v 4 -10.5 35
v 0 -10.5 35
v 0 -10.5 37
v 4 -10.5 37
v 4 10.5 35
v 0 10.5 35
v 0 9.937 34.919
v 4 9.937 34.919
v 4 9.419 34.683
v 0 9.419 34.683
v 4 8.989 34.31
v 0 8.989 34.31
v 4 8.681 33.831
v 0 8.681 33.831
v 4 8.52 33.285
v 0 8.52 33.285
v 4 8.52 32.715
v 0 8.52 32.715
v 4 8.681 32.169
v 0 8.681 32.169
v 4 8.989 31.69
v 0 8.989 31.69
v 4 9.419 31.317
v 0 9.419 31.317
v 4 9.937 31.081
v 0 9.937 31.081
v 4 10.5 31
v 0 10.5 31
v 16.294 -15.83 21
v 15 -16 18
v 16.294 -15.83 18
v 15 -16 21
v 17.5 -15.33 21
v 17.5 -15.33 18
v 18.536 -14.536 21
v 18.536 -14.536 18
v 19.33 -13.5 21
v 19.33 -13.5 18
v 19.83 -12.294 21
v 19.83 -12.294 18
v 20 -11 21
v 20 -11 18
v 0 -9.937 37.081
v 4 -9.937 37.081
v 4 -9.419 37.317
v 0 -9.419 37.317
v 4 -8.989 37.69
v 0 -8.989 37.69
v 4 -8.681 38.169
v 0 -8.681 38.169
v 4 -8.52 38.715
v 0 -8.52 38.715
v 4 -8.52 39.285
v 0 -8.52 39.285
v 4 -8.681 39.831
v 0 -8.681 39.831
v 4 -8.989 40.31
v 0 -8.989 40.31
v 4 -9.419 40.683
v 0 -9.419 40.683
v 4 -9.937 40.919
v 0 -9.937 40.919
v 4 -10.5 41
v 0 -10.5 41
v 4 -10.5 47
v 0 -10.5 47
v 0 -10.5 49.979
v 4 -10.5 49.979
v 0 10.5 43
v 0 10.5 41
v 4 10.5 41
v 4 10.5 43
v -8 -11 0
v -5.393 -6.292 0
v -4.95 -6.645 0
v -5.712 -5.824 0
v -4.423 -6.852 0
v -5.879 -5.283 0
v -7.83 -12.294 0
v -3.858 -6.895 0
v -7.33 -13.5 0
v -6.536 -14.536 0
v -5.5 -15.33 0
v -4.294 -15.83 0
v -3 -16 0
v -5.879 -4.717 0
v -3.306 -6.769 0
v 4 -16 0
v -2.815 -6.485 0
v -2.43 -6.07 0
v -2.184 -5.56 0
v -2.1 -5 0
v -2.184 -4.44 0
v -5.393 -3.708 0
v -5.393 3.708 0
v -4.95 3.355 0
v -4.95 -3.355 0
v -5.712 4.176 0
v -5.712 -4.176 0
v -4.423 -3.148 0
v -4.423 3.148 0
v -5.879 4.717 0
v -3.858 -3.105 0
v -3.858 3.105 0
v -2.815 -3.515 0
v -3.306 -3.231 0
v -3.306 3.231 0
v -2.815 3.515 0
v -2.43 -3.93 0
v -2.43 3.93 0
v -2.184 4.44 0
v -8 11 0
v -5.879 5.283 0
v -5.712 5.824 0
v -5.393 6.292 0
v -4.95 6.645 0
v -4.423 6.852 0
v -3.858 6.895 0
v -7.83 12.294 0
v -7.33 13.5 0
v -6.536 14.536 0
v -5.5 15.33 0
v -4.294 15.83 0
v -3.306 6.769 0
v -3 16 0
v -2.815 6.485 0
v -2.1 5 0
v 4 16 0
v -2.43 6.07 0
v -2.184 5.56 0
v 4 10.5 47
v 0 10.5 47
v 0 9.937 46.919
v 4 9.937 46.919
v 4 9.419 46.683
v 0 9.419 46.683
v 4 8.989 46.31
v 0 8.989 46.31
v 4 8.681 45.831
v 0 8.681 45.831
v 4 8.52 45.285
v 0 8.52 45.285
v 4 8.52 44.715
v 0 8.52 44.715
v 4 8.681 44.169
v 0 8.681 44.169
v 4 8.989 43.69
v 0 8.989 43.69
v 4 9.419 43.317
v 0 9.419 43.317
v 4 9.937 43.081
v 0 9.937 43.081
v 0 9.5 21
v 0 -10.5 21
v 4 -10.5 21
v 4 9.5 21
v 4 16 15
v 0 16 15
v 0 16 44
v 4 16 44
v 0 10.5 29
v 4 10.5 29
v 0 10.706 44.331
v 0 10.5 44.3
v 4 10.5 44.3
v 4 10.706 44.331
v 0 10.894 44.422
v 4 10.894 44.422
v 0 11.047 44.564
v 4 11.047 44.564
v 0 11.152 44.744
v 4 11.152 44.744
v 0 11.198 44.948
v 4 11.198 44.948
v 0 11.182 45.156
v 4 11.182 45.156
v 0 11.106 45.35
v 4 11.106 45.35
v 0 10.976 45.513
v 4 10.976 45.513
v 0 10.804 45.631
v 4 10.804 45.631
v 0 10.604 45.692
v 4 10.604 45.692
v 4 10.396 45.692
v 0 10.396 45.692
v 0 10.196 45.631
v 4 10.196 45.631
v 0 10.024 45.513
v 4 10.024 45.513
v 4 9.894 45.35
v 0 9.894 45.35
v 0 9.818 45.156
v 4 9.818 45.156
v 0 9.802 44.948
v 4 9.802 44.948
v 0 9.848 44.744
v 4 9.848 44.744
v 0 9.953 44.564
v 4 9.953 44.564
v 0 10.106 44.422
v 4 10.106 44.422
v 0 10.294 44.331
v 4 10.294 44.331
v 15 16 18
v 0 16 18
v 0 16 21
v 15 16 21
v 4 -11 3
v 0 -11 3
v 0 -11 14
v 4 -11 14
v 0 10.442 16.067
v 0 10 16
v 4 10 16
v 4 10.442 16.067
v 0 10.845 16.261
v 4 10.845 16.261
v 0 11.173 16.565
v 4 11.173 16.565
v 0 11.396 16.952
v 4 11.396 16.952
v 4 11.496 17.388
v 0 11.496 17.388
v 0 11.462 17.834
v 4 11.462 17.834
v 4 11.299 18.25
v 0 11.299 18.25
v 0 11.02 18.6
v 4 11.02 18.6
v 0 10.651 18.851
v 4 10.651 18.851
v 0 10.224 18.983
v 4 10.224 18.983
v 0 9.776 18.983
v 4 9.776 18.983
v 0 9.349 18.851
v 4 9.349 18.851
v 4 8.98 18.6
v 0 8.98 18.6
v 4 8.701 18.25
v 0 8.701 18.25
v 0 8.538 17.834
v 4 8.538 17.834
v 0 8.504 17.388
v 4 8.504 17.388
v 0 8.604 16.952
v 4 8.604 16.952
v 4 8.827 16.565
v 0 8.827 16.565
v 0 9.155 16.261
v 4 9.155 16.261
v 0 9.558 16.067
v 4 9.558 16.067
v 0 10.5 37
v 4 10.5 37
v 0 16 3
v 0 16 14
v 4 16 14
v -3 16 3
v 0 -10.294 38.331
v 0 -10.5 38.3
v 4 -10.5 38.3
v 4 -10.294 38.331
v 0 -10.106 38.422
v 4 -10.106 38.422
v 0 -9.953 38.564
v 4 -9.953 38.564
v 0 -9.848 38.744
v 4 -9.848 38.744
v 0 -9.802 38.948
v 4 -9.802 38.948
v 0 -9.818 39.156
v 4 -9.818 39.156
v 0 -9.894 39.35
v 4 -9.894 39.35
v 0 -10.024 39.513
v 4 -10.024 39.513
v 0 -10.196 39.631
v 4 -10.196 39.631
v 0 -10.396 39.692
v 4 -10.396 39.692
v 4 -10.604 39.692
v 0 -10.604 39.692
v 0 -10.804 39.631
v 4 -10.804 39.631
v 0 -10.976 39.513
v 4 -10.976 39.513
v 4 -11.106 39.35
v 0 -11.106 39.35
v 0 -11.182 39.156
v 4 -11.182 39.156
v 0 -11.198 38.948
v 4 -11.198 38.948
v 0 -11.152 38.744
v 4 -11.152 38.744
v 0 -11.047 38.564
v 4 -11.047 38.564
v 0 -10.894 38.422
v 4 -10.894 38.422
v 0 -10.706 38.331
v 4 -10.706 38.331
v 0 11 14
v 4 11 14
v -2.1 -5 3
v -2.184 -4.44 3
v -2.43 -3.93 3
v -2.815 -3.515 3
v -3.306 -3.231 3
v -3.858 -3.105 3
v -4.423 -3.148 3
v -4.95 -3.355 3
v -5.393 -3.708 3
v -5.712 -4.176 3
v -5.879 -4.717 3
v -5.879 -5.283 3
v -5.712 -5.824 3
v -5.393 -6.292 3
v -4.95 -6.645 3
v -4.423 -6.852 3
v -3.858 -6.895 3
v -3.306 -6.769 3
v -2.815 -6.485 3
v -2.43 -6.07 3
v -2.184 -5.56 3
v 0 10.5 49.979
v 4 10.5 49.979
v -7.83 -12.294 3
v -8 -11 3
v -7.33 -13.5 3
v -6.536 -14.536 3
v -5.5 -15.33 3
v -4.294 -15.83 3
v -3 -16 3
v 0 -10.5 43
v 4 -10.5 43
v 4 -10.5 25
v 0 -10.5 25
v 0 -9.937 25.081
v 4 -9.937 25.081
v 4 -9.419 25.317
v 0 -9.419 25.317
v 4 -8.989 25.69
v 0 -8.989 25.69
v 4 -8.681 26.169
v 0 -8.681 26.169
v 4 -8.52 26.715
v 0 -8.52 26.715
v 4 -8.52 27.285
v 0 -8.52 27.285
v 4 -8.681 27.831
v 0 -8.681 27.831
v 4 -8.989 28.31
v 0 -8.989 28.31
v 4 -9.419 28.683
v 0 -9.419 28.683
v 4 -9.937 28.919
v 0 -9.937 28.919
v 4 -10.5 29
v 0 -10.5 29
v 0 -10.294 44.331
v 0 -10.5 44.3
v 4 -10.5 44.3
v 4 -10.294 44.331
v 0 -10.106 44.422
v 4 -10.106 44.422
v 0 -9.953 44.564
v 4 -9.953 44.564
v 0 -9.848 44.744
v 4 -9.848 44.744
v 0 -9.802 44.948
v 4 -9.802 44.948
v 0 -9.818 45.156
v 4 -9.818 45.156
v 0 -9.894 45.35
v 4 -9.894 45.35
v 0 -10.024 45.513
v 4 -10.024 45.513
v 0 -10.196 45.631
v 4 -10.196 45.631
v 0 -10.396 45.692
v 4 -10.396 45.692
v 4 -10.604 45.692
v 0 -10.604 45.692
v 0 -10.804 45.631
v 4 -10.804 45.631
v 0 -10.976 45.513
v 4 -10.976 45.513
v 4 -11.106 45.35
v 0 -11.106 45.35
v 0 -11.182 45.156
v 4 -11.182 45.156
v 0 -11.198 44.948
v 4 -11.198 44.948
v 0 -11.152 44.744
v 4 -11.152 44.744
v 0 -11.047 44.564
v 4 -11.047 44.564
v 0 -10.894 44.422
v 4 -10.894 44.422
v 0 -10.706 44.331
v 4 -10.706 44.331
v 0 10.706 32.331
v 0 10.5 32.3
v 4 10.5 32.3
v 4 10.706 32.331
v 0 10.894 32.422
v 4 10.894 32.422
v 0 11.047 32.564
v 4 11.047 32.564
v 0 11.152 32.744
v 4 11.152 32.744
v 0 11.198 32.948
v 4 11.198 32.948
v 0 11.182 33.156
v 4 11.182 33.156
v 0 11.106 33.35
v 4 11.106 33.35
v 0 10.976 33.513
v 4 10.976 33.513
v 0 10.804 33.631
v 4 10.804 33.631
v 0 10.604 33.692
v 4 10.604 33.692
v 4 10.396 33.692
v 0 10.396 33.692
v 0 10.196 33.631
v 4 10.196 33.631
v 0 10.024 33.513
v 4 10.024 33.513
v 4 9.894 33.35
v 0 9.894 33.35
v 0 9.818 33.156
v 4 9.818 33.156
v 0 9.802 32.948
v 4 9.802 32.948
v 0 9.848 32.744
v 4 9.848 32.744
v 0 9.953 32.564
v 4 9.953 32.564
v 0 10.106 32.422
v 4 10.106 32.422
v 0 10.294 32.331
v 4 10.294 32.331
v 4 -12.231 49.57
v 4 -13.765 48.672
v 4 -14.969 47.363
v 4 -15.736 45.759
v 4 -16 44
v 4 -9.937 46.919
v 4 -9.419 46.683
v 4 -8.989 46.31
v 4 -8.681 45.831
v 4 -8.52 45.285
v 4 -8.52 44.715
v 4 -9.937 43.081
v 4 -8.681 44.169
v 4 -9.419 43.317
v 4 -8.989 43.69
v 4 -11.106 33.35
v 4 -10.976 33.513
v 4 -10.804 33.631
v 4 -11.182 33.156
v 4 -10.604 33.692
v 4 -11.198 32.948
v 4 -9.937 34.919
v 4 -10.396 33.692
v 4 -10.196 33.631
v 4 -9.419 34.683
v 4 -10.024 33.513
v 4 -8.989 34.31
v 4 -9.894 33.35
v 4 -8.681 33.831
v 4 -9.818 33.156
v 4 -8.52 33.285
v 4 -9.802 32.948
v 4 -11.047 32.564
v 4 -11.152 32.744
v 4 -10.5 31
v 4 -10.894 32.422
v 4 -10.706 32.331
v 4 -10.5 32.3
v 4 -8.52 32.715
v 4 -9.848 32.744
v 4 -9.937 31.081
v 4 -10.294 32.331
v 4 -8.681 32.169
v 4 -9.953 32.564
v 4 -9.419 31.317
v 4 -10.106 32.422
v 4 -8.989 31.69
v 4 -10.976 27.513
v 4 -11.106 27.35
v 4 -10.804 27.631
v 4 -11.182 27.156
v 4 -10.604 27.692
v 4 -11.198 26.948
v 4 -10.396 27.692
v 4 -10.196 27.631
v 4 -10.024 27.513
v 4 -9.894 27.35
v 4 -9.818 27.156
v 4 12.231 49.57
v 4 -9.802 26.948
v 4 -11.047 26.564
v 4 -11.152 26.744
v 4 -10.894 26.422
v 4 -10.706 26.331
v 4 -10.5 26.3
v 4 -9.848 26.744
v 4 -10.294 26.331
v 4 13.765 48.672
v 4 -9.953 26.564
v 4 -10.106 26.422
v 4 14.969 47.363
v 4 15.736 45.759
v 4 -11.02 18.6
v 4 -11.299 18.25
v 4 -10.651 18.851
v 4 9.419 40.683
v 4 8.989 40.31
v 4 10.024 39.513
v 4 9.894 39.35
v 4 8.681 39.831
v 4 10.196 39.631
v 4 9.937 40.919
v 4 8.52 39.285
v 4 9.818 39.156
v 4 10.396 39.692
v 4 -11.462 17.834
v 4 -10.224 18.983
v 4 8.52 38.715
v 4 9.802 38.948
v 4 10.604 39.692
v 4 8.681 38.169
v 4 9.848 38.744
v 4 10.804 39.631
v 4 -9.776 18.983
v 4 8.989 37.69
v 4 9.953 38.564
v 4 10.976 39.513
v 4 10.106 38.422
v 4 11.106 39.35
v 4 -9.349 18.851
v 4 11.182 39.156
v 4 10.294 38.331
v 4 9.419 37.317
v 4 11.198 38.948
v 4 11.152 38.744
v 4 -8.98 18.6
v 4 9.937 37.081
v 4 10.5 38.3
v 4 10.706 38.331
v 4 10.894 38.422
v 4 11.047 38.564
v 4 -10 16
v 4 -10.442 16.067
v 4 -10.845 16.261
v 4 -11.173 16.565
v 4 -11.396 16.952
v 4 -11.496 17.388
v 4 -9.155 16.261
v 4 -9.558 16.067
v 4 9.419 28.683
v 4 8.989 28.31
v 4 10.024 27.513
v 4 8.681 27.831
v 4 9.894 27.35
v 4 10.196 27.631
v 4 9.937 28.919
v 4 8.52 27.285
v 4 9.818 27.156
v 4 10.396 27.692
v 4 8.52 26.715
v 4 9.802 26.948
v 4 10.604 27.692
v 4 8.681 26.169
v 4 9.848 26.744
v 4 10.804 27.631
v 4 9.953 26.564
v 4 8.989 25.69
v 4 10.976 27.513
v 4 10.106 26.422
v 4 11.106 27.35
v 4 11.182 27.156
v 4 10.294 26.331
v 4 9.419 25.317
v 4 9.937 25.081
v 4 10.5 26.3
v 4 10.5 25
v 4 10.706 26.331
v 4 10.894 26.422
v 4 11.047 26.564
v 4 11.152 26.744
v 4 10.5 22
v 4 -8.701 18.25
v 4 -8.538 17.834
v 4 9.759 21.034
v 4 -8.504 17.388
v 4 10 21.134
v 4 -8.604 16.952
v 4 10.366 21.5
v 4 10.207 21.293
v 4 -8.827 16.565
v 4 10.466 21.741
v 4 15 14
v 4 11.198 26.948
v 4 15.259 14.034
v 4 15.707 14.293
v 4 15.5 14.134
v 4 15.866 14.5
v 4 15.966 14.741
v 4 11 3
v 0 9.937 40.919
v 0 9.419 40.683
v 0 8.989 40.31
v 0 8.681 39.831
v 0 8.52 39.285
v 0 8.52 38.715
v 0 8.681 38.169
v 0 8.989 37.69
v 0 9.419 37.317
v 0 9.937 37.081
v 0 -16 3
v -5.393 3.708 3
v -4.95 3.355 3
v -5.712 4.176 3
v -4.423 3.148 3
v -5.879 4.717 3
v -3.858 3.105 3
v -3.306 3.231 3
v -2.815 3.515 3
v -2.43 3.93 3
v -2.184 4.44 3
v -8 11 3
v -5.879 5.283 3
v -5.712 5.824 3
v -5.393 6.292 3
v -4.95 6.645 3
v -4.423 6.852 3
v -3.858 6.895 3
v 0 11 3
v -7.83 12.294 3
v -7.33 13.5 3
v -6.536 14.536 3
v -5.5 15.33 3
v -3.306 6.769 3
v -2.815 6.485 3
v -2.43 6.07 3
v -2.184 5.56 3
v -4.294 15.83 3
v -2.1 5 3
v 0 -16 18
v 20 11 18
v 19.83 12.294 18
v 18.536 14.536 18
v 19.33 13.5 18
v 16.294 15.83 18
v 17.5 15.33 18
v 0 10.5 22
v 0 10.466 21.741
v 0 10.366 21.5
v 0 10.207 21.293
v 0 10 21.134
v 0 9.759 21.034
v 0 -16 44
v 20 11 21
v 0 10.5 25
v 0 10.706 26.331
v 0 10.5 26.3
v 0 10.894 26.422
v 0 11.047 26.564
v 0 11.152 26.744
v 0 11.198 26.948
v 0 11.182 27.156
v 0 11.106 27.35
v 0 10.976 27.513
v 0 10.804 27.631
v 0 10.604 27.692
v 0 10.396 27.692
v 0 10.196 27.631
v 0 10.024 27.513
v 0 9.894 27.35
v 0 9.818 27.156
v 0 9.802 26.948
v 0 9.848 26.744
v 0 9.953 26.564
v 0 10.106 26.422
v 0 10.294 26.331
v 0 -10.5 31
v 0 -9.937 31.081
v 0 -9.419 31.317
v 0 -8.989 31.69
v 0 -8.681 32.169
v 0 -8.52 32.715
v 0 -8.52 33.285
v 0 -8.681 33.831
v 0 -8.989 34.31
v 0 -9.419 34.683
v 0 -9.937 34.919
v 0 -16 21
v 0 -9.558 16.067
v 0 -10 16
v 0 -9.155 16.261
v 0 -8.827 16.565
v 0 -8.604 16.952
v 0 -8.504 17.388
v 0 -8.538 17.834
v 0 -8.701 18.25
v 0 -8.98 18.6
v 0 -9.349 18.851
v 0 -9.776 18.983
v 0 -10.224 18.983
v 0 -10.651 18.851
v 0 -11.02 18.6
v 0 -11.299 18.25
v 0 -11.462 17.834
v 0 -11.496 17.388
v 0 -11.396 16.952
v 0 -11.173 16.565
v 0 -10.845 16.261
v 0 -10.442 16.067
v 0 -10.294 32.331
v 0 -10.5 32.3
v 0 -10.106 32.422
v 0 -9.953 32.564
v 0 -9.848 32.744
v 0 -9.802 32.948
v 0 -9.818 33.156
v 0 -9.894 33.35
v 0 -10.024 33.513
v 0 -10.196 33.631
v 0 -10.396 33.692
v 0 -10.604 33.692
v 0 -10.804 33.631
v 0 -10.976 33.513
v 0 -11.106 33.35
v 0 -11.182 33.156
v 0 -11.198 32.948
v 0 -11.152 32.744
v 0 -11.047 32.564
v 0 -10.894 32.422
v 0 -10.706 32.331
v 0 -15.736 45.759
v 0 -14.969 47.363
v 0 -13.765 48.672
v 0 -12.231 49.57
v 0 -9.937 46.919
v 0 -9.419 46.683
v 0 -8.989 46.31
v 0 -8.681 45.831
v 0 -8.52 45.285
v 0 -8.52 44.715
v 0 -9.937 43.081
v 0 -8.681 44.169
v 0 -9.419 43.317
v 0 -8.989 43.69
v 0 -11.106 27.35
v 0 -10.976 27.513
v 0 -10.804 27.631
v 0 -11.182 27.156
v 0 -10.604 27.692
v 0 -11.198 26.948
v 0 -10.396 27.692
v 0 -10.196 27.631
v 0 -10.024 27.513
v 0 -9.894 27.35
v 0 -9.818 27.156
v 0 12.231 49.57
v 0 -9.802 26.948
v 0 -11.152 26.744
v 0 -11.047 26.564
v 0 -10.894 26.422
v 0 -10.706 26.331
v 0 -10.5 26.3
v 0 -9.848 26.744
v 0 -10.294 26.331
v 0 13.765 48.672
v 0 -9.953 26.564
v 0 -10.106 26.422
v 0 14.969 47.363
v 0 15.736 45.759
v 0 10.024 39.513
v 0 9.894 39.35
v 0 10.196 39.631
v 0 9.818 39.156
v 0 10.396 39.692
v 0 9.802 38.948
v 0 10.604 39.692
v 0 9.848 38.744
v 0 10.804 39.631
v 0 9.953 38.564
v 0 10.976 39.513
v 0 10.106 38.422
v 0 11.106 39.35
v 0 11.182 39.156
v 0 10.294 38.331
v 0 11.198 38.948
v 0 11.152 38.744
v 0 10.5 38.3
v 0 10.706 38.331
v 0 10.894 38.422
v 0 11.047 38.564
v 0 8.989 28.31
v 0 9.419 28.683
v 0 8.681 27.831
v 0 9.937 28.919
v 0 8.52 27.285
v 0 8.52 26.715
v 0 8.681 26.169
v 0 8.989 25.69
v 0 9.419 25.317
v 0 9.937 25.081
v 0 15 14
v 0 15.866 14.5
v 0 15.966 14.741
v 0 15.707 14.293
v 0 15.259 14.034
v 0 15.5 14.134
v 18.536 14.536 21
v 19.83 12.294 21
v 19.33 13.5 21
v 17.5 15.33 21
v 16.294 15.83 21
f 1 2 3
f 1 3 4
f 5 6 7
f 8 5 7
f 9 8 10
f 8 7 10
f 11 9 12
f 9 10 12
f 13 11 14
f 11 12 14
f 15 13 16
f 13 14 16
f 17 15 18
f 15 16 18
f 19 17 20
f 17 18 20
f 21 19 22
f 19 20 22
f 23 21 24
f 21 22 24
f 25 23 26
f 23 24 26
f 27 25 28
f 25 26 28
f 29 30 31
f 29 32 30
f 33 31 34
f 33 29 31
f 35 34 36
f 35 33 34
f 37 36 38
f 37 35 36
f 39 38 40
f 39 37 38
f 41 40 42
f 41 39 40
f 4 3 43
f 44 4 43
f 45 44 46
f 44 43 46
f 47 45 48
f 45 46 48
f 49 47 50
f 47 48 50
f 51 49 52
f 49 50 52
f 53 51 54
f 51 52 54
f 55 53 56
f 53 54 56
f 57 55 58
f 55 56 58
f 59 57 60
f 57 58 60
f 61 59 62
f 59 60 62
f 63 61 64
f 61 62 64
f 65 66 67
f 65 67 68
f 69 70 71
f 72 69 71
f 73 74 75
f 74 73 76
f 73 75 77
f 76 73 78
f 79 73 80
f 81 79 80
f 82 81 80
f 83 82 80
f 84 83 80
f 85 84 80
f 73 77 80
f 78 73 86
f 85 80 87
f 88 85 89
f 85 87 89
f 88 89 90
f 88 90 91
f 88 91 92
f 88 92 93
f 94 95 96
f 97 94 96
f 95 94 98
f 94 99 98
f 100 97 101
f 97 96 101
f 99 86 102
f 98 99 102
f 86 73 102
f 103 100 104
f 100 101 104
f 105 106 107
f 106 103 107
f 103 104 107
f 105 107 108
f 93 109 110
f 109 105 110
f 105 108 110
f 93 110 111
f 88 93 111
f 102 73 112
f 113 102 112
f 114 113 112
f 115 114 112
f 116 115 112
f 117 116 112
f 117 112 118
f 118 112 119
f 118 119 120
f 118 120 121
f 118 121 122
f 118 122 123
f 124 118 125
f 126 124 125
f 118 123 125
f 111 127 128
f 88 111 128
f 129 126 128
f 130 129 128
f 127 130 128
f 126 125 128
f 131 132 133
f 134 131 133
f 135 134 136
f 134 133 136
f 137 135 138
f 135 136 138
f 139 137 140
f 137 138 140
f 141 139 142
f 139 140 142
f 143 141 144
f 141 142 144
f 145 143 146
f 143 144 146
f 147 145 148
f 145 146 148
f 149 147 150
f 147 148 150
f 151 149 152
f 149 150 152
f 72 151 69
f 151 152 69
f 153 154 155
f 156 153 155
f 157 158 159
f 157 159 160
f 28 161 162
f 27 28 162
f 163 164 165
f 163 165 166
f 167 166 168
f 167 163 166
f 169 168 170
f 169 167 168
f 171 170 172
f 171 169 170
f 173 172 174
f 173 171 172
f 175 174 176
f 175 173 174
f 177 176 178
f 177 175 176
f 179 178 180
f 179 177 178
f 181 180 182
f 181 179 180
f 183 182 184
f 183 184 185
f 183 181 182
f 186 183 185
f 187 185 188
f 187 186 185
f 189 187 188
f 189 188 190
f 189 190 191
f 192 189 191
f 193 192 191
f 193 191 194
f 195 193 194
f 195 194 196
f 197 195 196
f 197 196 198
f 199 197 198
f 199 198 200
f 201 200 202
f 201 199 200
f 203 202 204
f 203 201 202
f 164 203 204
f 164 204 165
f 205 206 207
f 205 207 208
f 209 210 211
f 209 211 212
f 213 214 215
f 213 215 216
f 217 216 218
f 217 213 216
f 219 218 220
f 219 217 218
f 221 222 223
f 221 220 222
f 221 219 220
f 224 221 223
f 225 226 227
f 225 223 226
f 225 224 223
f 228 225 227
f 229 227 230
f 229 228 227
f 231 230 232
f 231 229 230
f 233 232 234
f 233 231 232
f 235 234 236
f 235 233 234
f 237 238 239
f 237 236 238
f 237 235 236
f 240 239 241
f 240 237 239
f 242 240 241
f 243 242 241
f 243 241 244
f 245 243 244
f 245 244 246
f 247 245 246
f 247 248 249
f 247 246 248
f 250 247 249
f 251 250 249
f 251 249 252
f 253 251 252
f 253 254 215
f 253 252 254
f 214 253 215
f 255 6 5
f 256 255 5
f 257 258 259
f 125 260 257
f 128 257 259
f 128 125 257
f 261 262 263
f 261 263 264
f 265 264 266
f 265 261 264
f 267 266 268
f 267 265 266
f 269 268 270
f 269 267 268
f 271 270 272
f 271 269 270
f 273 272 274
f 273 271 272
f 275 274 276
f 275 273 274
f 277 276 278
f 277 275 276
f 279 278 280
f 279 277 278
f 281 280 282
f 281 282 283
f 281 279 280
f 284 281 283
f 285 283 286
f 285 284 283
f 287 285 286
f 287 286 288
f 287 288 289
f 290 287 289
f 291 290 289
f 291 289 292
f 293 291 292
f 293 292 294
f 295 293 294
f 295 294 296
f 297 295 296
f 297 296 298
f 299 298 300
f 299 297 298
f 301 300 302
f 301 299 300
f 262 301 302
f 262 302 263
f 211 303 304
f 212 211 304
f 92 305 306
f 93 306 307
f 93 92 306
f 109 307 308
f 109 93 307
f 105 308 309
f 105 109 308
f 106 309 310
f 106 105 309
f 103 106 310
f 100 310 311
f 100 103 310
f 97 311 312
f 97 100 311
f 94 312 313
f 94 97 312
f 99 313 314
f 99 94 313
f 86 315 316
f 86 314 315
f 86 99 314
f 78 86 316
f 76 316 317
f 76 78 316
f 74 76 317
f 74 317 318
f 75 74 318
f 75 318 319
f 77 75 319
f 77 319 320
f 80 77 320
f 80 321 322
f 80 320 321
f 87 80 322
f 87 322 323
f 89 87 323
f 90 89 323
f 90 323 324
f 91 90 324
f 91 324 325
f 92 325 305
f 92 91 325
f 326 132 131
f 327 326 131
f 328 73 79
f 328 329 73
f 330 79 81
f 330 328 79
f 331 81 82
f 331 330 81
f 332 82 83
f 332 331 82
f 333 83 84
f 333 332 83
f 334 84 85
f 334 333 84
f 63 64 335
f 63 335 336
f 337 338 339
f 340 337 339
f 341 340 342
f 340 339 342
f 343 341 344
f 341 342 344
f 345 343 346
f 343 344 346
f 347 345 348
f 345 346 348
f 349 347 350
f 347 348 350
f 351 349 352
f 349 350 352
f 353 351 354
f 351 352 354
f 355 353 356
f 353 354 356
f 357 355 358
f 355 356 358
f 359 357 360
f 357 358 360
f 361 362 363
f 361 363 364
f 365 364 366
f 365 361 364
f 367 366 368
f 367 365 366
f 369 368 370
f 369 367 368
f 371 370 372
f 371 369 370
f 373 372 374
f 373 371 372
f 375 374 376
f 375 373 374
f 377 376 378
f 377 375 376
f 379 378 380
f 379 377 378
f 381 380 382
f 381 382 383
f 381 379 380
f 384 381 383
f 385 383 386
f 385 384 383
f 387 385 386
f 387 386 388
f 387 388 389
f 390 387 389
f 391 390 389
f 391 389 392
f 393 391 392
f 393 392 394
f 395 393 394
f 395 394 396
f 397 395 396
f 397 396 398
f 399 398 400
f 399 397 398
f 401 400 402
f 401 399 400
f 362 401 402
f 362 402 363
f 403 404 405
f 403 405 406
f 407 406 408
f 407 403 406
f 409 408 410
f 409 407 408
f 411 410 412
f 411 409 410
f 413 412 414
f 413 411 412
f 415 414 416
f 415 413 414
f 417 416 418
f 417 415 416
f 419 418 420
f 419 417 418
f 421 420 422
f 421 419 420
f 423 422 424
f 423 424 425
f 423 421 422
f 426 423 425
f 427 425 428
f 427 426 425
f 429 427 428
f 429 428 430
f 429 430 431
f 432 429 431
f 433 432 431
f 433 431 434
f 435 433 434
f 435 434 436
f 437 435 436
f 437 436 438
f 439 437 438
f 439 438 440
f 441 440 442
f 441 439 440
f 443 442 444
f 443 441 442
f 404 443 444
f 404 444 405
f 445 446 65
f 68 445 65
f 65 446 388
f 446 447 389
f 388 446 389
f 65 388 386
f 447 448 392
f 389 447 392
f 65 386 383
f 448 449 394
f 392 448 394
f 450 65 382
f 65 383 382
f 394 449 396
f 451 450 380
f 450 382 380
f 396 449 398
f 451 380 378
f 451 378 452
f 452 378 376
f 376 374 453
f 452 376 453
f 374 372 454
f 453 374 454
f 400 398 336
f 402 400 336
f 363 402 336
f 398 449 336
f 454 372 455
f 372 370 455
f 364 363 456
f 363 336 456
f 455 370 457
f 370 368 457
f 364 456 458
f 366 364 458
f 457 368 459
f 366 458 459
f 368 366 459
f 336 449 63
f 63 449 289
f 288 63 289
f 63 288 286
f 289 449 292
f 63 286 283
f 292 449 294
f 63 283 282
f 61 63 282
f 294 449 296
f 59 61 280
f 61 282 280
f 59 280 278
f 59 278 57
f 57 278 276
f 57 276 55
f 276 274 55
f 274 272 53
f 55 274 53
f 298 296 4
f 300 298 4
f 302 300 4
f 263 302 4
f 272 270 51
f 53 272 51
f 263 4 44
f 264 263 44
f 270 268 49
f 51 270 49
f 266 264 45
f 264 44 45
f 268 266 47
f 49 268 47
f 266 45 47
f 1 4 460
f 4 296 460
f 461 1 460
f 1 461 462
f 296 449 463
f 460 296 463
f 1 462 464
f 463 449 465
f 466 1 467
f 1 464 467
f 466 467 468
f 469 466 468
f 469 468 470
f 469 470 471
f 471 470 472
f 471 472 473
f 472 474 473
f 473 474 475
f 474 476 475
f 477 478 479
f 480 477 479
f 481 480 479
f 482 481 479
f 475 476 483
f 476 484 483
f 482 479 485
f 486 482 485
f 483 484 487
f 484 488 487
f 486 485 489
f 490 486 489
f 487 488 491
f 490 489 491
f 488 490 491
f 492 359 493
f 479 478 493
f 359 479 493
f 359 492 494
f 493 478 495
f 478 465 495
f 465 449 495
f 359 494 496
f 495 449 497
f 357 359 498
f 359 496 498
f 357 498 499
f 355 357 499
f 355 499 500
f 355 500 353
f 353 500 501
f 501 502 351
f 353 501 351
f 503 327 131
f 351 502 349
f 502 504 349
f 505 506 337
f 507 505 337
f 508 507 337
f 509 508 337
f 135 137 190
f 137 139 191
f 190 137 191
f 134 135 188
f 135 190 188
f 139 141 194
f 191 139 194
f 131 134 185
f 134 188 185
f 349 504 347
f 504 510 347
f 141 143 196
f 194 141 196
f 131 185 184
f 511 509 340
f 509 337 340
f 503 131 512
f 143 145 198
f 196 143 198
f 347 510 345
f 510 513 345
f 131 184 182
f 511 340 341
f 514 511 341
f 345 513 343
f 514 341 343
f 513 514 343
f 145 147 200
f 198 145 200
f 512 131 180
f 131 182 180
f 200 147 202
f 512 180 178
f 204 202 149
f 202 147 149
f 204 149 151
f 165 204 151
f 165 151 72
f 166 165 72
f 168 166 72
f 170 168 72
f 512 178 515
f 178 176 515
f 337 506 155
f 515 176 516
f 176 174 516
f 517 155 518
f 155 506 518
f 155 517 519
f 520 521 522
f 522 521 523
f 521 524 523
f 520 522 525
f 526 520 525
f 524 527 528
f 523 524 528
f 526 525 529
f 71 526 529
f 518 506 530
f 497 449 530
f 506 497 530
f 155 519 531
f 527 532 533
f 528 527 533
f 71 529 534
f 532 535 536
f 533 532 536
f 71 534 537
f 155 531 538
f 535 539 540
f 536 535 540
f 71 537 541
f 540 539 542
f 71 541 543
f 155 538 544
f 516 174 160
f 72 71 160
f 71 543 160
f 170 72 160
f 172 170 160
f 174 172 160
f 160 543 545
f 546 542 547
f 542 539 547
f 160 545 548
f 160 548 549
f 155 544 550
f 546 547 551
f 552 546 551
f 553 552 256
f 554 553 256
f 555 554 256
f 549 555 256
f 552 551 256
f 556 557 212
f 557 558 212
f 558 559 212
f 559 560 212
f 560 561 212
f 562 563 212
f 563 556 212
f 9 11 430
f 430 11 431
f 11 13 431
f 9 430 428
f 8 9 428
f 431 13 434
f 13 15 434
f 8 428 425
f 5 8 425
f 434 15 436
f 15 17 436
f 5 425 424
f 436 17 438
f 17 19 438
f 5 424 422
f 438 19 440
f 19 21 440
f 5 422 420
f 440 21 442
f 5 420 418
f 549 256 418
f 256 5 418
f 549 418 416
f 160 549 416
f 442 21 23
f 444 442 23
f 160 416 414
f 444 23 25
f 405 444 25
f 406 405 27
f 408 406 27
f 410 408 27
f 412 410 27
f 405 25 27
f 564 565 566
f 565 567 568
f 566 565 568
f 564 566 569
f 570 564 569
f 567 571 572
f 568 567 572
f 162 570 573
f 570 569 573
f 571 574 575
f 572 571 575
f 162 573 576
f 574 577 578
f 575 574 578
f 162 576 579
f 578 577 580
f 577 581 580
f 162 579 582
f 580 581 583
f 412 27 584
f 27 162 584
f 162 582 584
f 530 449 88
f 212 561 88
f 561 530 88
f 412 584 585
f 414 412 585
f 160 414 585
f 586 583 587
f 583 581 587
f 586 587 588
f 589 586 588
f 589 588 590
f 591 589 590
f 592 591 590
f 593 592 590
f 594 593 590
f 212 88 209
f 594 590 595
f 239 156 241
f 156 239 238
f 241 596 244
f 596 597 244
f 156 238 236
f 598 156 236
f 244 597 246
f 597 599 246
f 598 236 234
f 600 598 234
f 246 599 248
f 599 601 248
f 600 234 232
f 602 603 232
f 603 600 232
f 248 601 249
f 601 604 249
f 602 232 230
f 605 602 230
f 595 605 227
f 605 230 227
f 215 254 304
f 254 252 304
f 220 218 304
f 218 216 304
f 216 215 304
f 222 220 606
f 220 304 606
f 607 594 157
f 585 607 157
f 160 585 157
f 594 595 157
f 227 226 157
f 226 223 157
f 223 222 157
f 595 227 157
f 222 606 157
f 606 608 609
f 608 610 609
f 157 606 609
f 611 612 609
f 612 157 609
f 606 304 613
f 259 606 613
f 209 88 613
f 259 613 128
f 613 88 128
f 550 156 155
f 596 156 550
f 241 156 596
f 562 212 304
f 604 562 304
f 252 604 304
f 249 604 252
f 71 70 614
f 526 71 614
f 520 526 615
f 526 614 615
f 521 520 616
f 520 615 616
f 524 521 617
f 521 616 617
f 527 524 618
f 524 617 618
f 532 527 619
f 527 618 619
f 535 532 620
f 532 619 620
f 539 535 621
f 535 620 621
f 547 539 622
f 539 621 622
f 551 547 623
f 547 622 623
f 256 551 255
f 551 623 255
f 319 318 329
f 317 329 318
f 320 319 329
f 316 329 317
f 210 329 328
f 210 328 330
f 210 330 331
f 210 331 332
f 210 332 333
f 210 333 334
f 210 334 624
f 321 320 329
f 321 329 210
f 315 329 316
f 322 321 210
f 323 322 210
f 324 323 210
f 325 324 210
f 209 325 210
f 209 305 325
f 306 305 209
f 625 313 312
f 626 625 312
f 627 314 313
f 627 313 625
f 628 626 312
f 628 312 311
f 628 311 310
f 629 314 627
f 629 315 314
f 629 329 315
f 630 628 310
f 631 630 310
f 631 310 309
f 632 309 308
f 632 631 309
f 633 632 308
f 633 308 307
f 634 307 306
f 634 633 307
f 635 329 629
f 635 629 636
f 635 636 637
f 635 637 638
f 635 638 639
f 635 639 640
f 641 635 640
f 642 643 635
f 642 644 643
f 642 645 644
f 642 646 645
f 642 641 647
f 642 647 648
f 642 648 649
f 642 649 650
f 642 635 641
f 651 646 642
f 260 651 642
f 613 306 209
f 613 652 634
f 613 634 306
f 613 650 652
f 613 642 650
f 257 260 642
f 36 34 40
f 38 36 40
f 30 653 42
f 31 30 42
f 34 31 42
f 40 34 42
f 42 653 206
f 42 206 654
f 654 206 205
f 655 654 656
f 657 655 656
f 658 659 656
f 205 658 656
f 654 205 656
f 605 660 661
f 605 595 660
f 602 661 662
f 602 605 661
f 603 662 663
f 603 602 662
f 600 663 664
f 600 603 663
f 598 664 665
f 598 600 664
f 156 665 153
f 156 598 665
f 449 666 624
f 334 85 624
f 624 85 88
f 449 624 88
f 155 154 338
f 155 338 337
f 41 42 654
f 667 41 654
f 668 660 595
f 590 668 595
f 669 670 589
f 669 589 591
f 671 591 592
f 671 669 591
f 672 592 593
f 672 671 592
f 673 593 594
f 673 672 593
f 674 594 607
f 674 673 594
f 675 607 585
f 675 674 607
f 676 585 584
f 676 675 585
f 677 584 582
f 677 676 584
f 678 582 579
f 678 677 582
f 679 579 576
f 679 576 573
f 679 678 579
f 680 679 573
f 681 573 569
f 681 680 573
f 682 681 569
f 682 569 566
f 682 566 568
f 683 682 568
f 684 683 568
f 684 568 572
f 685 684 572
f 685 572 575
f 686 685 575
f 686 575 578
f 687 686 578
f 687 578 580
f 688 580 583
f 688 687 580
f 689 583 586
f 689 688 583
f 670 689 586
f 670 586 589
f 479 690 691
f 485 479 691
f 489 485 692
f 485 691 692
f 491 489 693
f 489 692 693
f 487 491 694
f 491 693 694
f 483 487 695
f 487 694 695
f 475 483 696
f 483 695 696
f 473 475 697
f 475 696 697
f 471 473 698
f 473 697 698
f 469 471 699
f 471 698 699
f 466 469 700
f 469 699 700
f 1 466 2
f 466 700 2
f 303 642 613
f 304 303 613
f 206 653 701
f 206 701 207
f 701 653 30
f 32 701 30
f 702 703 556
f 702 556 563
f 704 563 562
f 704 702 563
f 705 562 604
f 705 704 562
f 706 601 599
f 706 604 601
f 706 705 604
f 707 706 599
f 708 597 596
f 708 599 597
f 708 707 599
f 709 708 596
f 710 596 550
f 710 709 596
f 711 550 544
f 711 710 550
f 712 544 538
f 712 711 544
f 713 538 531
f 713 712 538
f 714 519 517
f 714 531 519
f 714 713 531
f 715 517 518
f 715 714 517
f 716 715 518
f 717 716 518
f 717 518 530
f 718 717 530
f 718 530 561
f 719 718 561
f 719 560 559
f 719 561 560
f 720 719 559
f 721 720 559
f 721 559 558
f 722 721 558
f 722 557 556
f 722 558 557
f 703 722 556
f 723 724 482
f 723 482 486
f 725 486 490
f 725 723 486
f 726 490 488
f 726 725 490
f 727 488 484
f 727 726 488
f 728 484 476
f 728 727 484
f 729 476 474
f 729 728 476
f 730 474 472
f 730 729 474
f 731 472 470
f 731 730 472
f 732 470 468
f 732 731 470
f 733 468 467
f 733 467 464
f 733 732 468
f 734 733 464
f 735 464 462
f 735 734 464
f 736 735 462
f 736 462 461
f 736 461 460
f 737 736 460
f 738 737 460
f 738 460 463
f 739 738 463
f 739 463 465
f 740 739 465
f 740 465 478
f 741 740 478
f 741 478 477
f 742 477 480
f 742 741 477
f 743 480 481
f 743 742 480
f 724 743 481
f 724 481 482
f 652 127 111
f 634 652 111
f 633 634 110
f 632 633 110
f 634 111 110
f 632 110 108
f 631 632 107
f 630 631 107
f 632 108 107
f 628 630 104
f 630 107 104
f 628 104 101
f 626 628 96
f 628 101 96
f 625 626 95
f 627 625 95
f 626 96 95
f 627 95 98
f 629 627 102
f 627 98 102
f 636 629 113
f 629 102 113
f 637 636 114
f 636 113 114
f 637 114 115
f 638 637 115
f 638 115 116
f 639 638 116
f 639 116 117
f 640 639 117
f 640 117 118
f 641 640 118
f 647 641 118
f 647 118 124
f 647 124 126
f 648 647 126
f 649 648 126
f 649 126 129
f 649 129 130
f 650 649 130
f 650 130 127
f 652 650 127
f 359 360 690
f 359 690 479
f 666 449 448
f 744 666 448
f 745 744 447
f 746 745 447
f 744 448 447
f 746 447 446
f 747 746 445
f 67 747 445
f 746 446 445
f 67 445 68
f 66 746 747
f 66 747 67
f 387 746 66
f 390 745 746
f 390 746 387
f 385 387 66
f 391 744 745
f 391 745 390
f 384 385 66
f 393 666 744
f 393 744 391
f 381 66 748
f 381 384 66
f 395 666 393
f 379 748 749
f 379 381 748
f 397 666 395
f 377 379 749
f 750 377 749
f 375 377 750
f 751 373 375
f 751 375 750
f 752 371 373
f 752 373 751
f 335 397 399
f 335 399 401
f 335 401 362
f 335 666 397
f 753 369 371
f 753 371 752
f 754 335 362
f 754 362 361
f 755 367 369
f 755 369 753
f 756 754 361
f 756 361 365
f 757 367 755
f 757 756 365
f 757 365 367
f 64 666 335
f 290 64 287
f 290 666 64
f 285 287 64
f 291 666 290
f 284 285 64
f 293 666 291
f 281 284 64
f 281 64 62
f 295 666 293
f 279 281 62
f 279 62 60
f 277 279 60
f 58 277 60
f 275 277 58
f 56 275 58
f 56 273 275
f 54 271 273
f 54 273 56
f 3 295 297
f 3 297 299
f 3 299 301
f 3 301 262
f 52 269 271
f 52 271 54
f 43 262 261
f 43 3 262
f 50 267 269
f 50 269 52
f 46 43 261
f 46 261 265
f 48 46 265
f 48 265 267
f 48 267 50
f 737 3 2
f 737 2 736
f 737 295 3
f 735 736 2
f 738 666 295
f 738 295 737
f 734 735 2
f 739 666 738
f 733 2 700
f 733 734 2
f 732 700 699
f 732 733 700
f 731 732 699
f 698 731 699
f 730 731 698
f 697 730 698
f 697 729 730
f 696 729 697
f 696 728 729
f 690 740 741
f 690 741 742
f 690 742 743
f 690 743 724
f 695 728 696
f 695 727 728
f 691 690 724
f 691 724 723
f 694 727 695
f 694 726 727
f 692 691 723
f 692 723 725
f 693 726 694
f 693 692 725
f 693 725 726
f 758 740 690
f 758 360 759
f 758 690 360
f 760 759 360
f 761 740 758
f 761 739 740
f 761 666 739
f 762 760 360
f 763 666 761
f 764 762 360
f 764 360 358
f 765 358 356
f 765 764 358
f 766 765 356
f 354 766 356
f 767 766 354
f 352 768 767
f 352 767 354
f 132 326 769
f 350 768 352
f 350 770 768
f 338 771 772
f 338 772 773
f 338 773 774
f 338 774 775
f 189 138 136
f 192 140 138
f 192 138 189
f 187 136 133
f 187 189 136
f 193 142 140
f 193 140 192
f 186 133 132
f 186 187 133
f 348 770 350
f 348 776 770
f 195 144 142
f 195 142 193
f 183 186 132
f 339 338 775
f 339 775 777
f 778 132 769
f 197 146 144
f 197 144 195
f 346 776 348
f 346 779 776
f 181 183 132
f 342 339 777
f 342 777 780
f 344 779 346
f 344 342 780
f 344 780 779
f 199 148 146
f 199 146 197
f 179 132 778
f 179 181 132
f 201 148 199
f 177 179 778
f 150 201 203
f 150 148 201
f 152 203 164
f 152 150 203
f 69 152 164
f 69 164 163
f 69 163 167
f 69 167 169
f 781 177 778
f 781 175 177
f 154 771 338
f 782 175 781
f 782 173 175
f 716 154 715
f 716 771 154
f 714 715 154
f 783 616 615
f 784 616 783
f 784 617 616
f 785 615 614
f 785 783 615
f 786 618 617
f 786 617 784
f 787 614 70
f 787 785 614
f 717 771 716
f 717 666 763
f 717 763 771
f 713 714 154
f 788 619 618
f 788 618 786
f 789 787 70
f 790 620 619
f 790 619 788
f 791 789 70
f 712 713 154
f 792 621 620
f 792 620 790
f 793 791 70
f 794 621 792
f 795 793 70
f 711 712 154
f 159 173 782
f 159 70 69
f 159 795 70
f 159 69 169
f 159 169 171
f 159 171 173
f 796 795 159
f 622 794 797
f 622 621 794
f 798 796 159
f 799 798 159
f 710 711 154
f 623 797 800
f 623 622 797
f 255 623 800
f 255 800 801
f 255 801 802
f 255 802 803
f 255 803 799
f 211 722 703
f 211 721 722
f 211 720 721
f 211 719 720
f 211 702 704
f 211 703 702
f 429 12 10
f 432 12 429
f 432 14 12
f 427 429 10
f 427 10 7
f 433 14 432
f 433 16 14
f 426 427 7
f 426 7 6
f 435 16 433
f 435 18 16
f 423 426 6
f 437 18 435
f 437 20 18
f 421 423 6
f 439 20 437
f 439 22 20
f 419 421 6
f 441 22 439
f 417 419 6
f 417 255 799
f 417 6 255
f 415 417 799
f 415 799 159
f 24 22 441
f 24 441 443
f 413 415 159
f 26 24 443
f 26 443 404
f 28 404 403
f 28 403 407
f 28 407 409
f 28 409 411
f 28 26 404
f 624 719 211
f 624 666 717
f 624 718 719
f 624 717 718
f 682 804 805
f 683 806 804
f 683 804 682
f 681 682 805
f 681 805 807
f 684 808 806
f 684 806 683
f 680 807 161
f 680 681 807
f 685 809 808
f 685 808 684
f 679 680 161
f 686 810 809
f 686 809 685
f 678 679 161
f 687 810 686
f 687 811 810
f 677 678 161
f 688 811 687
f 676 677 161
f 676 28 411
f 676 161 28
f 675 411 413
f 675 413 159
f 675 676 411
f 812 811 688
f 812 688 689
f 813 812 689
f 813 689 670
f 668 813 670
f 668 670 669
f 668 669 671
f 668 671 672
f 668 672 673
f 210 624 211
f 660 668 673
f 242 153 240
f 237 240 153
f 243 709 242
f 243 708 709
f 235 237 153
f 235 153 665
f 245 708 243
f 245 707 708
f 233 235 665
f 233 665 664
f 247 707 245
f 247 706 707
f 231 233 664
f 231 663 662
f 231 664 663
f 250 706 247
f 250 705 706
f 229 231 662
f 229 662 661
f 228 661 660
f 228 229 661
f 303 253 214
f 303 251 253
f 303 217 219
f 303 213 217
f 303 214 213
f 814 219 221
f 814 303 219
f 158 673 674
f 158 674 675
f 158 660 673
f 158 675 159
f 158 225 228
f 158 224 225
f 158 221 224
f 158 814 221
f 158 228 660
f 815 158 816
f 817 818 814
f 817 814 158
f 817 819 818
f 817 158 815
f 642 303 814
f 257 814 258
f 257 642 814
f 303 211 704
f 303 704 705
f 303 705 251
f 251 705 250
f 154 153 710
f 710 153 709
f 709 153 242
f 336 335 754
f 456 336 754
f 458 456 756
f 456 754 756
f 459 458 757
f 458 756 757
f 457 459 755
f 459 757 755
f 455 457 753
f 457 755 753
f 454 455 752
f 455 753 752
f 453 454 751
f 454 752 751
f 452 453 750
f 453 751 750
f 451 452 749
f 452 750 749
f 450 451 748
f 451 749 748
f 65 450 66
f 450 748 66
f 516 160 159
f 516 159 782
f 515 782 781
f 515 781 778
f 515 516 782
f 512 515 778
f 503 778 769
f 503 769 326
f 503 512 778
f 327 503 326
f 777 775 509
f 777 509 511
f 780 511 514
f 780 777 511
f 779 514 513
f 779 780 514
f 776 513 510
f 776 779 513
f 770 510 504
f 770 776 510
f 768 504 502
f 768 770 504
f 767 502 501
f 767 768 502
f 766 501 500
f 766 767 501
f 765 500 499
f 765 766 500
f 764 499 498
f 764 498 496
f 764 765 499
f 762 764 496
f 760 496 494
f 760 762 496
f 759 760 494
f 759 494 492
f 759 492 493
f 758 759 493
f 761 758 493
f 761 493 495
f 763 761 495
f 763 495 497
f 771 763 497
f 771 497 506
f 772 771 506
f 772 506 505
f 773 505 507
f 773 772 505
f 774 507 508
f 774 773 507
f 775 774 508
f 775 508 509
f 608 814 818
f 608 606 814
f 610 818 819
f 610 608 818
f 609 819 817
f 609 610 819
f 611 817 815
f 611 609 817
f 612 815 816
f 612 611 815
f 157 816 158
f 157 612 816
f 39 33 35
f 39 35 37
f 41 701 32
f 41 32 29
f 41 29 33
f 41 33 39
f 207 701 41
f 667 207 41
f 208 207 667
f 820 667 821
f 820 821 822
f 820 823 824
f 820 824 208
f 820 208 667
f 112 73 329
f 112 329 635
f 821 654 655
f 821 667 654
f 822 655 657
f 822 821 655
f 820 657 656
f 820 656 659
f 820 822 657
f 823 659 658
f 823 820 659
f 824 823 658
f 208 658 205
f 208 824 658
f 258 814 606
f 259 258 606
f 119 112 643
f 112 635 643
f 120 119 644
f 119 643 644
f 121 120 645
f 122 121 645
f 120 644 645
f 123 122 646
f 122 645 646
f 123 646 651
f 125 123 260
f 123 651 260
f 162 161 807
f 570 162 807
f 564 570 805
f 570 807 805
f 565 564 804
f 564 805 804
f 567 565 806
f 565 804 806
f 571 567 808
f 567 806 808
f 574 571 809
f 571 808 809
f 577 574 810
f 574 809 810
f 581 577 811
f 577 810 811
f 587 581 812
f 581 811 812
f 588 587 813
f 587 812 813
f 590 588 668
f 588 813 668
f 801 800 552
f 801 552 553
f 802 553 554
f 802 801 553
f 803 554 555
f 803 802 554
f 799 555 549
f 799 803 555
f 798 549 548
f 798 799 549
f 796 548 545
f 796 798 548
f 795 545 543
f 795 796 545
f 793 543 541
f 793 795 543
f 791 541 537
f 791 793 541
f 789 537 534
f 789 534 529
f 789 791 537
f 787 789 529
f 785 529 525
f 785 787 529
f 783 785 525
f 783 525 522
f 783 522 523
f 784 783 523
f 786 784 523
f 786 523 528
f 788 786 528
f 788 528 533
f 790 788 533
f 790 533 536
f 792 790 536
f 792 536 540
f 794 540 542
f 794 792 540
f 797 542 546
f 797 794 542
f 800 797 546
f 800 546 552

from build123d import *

# Parameters (mm, degrees)
CYLINDER003_R     = 1.5
CYLINDER003_DEPTH = 10
ARRAY002_Y_COUNT  = 2
ARRAY002_Y_PITCH  = 20
CYLINDER001_R     = 0.7
CYLINDER001_DEPTH = 4
ARRAY001_Y_COUNT  = 2
ARRAY001_Y_PITCH  = 21
ARRAY001_Z_COUNT  = 4
ARRAY001_Z_PITCH  = 6
BOX001_W          = 4
BOX001_H          = 21
BOX001_DEPTH      = 74
BOX_W             = 4
BOX_H             = 32
BOX_DEPTH         = 36
FILLET001_R       = 6
FILLET004_R       = 1
CYLINDER_R        = 2
CYLINDER_DEPTH    = 4
ARRAY_Y_COUNT     = 2
ARRAY_Y_PITCH     = 21
ARRAY_Z_COUNT     = 4
ARRAY_Z_PITCH     = 6
CYLINDER002_R     = 1.9
CYLINDER002_DEPTH = 10
BOX002_W          = 4
BOX002_H          = 5
BOX002_DEPTH      = 14
BOX003_W          = 12
BOX003_H          = 32
BOX003_DEPTH      = 3
FILLET_R          = 5
BOX004_W          = 20
BOX004_H          = 32
BOX004_DEPTH      = 3
FILLET005_R       = 5


with BuildPart() as middle_bolt_hole_array:
    # Cylinder003 → Cylinder003 (new body)
    with BuildSketch(Plane(origin=(0, 0, 0), x_dir=(0, 0, -1), z_dir=(1, 0, 0))):
        Circle(CYLINDER003_R)
    extrude(amount=CYLINDER003_DEPTH)

    # Array002 Y: middle bolt hole array ×2


with BuildPart() as middle_bolt_hole_array_1:
    add(middle_bolt_hole_array.part)
    with Locations(*[(0, i * ARRAY002_Y_PITCH, 0) for i in range(1, ARRAY002_Y_COUNT)]):
        add(middle_bolt_hole_array.part)


with BuildPart() as middle_bolt_hole_array_2:
    # Array002 placement: moved
    add(middle_bolt_hole_array_1.part.moved(Location((-5, -10, 3.5))))


with BuildPart() as camera_hole_fusion:
    # Cylinder001 → Cylinder001 (new body)
    with BuildSketch(Plane(origin=(0, 0, 0), x_dir=(0, 0, -1), z_dir=(1, 0, 0))):
        Circle(CYLINDER001_R)
    extrude(amount=CYLINDER001_DEPTH)

    # Array001 Y: camera hole fusion ×2


with BuildPart() as camera_hole_fusion_1:
    add(camera_hole_fusion.part)
    with Locations(*[(0, i * ARRAY001_Y_PITCH, 0) for i in range(1, ARRAY001_Y_COUNT)]):
        add(camera_hole_fusion.part)

    # Array001 Z: camera hole fusion ×4


with BuildPart() as camera_hole_fusion_2:
    add(camera_hole_fusion_1.part)
    with Locations(*[(0, 0, i * ARRAY001_Z_PITCH) for i in range(1, ARRAY001_Z_COUNT)]):
        add(camera_hole_fusion_1.part)


with BuildPart() as camera_hole_fusion_3:
    # Array001 placement: moved
    add(camera_hole_fusion_2.part.moved(Location((0, -10.5, 13))))

    # Fusion003002: union middle bolt hole array
    add(middle_bolt_hole_array_2.part)


with BuildPart() as camera_plate_hole:
    # Box001 → Box001 (new body)
    with BuildSketch(Plane(origin=(0, -10.5, 7), x_dir=(1, 0, 0), z_dir=(0, 0, 1))):
        with Locations((2, 10.5)):
            Rectangle(BOX001_W, BOX001_H)
    extrude(amount=BOX001_DEPTH)


with BuildPart() as camera_plate_cut_fillet:
    # Box → Box (new body)
    with BuildSketch(Plane(origin=(0, -16, 0), x_dir=(1, 0, 0), z_dir=(0, 0, 1))):
        with Locations((2, 16)):
            Rectangle(BOX_W, BOX_H)
    extrude(amount=BOX_DEPTH)

    # Fillet001
    fillet001_edges = [camera_plate_cut_fillet.edges().sort_by_distance(p)[0] for p in [
        (2, -16, 36),
        (2, 16, 36),
    ]]
    fillet(fillet001_edges, radius=FILLET001_R)

    # Cut001: cut camera plate hole
    add(camera_plate_hole.part, mode=Mode.SUBTRACT)

    # Fillet004
    fillet004_edges = [camera_plate_cut_fillet.edges().sort_by_distance(p)[0] for p in [
        (2, 10.5, 7),
        (2, 16, 0),
    ]]
    fillet(fillet004_edges, radius=FILLET004_R)


with BuildPart() as camera_holder_cut:
    # Cylinder → Cylinder (new body)
    with BuildSketch(Plane(origin=(0, 0, 0), x_dir=(0, 0, -1), z_dir=(1, 0, 0))):
        Circle(CYLINDER_R)
    extrude(amount=CYLINDER_DEPTH)

    # Array Y: camera holder cut ×2


with BuildPart() as camera_holder_cut_1:
    add(camera_holder_cut.part)
    with Locations(*[(0, i * ARRAY_Y_PITCH, 0) for i in range(1, ARRAY_Y_COUNT)]):
        add(camera_holder_cut.part)

    # Array Z: camera holder cut ×4


with BuildPart() as camera_holder_cut_2:
    add(camera_holder_cut_1.part)
    with Locations(*[(0, 0, i * ARRAY_Z_PITCH) for i in range(1, ARRAY_Z_COUNT)]):
        add(camera_holder_cut_1.part)


with BuildPart() as camera_holder_cut_3:
    # Array placement: moved
    add(camera_holder_cut_2.part.moved(Location((0, -10.5, 13))))

    # Fusion: union camera plate cut fillet
    add(camera_plate_cut_fillet.part)

    # Cut: cut camera hole fusion
    add(camera_hole_fusion_3.part, mode=Mode.SUBTRACT)


with BuildPart() as camera_holder_cut_4:
    # Cut placement: moved
    add(camera_holder_cut_3.part.moved(Location((0, 0, 14))))


with BuildPart() as bottom_bolt_hole:
    # Cylinder002 → Cylinder002 (new body)
    with BuildSketch(Plane(origin=(0, -5, 0), x_dir=(1, 0, 0), z_dir=(0, 0, 1))):
        Circle(CYLINDER002_R)
    extrude(amount=CYLINDER002_DEPTH)


with BuildPart() as bottom_hole_fusion:
    # Part__Mirroring001: instance of bottom bolt hole
    add(bottom_bolt_hole.part.mirror(Plane(origin=(0, 0, 0), x_dir=(1, 0, 0), z_dir=(0, 1, 0))))

    # Fusion002: union bottom bolt hole
    add(bottom_bolt_hole.part)


with BuildPart() as bottom_hole_fusion_1:
    # Fusion002 placement: moved
    add(bottom_hole_fusion.part.moved(Location((-4, 0, 0))))


with BuildPart() as side_cube:
    # Box002 → Box002 (new body)
    with BuildSketch(Plane(origin=(0, -16, 0), x_dir=(1, 0, 0), z_dir=(0, 0, 1))):
        with Locations((2, 2.5)):
            Rectangle(BOX002_W, BOX002_H)
    extrude(amount=BOX002_DEPTH)


with BuildPart() as bottom_cube_fillet:
    # Box003 → Box003 (new body)
    with BuildSketch(Plane(origin=(-8, -16, 0), x_dir=(1, 0, 0), z_dir=(0, 0, 1))):
        with Locations((6, 16)):
            Rectangle(BOX003_W, BOX003_H)
    extrude(amount=BOX003_DEPTH)

    # Fillet
    fillet_edges = [bottom_cube_fillet.edges().sort_by_distance(p)[0] for p in [
        (-8, -16, 1.5),
        (-8, 16, 1.5),
    ]]
    fillet(fillet_edges, radius=FILLET_R)


with BuildPart() as camera_holder_with_stand001:
    # Part__Mirroring: instance of side cube
    add(side_cube.part.mirror(Plane(origin=(0, 0, 0), x_dir=(1, 0, 0), z_dir=(0, 1, 0))))

    # Fusion001: union side cube, bottom cube fillet
    add(side_cube.part)
    add(bottom_cube_fillet.part)

    # Cut002: cut bottom hole fusion
    add(bottom_hole_fusion_1.part, mode=Mode.SUBTRACT)

    # Fusion003: union camera holder cut
    add(camera_holder_cut_4.part)


with BuildPart() as moddle_cube_fillet:
    # Box004 → Box004 (new body)
    with BuildSketch(Plane(origin=(0, -16, 18), x_dir=(1, 0, 0), z_dir=(0, 0, 1))):
        with Locations((10, 16)):
            Rectangle(BOX004_W, BOX004_H)
    extrude(amount=BOX004_DEPTH)

    # Fillet005
    fillet005_edges = [moddle_cube_fillet.edges().sort_by_distance(p)[0] for p in [
        (20, -16, 19.5),
        (20, 16, 19.5),
    ]]
    fillet(fillet005_edges, radius=FILLET005_R)


solid = Compound([camera_holder_with_stand001.part, moddle_cube_fillet.part])
